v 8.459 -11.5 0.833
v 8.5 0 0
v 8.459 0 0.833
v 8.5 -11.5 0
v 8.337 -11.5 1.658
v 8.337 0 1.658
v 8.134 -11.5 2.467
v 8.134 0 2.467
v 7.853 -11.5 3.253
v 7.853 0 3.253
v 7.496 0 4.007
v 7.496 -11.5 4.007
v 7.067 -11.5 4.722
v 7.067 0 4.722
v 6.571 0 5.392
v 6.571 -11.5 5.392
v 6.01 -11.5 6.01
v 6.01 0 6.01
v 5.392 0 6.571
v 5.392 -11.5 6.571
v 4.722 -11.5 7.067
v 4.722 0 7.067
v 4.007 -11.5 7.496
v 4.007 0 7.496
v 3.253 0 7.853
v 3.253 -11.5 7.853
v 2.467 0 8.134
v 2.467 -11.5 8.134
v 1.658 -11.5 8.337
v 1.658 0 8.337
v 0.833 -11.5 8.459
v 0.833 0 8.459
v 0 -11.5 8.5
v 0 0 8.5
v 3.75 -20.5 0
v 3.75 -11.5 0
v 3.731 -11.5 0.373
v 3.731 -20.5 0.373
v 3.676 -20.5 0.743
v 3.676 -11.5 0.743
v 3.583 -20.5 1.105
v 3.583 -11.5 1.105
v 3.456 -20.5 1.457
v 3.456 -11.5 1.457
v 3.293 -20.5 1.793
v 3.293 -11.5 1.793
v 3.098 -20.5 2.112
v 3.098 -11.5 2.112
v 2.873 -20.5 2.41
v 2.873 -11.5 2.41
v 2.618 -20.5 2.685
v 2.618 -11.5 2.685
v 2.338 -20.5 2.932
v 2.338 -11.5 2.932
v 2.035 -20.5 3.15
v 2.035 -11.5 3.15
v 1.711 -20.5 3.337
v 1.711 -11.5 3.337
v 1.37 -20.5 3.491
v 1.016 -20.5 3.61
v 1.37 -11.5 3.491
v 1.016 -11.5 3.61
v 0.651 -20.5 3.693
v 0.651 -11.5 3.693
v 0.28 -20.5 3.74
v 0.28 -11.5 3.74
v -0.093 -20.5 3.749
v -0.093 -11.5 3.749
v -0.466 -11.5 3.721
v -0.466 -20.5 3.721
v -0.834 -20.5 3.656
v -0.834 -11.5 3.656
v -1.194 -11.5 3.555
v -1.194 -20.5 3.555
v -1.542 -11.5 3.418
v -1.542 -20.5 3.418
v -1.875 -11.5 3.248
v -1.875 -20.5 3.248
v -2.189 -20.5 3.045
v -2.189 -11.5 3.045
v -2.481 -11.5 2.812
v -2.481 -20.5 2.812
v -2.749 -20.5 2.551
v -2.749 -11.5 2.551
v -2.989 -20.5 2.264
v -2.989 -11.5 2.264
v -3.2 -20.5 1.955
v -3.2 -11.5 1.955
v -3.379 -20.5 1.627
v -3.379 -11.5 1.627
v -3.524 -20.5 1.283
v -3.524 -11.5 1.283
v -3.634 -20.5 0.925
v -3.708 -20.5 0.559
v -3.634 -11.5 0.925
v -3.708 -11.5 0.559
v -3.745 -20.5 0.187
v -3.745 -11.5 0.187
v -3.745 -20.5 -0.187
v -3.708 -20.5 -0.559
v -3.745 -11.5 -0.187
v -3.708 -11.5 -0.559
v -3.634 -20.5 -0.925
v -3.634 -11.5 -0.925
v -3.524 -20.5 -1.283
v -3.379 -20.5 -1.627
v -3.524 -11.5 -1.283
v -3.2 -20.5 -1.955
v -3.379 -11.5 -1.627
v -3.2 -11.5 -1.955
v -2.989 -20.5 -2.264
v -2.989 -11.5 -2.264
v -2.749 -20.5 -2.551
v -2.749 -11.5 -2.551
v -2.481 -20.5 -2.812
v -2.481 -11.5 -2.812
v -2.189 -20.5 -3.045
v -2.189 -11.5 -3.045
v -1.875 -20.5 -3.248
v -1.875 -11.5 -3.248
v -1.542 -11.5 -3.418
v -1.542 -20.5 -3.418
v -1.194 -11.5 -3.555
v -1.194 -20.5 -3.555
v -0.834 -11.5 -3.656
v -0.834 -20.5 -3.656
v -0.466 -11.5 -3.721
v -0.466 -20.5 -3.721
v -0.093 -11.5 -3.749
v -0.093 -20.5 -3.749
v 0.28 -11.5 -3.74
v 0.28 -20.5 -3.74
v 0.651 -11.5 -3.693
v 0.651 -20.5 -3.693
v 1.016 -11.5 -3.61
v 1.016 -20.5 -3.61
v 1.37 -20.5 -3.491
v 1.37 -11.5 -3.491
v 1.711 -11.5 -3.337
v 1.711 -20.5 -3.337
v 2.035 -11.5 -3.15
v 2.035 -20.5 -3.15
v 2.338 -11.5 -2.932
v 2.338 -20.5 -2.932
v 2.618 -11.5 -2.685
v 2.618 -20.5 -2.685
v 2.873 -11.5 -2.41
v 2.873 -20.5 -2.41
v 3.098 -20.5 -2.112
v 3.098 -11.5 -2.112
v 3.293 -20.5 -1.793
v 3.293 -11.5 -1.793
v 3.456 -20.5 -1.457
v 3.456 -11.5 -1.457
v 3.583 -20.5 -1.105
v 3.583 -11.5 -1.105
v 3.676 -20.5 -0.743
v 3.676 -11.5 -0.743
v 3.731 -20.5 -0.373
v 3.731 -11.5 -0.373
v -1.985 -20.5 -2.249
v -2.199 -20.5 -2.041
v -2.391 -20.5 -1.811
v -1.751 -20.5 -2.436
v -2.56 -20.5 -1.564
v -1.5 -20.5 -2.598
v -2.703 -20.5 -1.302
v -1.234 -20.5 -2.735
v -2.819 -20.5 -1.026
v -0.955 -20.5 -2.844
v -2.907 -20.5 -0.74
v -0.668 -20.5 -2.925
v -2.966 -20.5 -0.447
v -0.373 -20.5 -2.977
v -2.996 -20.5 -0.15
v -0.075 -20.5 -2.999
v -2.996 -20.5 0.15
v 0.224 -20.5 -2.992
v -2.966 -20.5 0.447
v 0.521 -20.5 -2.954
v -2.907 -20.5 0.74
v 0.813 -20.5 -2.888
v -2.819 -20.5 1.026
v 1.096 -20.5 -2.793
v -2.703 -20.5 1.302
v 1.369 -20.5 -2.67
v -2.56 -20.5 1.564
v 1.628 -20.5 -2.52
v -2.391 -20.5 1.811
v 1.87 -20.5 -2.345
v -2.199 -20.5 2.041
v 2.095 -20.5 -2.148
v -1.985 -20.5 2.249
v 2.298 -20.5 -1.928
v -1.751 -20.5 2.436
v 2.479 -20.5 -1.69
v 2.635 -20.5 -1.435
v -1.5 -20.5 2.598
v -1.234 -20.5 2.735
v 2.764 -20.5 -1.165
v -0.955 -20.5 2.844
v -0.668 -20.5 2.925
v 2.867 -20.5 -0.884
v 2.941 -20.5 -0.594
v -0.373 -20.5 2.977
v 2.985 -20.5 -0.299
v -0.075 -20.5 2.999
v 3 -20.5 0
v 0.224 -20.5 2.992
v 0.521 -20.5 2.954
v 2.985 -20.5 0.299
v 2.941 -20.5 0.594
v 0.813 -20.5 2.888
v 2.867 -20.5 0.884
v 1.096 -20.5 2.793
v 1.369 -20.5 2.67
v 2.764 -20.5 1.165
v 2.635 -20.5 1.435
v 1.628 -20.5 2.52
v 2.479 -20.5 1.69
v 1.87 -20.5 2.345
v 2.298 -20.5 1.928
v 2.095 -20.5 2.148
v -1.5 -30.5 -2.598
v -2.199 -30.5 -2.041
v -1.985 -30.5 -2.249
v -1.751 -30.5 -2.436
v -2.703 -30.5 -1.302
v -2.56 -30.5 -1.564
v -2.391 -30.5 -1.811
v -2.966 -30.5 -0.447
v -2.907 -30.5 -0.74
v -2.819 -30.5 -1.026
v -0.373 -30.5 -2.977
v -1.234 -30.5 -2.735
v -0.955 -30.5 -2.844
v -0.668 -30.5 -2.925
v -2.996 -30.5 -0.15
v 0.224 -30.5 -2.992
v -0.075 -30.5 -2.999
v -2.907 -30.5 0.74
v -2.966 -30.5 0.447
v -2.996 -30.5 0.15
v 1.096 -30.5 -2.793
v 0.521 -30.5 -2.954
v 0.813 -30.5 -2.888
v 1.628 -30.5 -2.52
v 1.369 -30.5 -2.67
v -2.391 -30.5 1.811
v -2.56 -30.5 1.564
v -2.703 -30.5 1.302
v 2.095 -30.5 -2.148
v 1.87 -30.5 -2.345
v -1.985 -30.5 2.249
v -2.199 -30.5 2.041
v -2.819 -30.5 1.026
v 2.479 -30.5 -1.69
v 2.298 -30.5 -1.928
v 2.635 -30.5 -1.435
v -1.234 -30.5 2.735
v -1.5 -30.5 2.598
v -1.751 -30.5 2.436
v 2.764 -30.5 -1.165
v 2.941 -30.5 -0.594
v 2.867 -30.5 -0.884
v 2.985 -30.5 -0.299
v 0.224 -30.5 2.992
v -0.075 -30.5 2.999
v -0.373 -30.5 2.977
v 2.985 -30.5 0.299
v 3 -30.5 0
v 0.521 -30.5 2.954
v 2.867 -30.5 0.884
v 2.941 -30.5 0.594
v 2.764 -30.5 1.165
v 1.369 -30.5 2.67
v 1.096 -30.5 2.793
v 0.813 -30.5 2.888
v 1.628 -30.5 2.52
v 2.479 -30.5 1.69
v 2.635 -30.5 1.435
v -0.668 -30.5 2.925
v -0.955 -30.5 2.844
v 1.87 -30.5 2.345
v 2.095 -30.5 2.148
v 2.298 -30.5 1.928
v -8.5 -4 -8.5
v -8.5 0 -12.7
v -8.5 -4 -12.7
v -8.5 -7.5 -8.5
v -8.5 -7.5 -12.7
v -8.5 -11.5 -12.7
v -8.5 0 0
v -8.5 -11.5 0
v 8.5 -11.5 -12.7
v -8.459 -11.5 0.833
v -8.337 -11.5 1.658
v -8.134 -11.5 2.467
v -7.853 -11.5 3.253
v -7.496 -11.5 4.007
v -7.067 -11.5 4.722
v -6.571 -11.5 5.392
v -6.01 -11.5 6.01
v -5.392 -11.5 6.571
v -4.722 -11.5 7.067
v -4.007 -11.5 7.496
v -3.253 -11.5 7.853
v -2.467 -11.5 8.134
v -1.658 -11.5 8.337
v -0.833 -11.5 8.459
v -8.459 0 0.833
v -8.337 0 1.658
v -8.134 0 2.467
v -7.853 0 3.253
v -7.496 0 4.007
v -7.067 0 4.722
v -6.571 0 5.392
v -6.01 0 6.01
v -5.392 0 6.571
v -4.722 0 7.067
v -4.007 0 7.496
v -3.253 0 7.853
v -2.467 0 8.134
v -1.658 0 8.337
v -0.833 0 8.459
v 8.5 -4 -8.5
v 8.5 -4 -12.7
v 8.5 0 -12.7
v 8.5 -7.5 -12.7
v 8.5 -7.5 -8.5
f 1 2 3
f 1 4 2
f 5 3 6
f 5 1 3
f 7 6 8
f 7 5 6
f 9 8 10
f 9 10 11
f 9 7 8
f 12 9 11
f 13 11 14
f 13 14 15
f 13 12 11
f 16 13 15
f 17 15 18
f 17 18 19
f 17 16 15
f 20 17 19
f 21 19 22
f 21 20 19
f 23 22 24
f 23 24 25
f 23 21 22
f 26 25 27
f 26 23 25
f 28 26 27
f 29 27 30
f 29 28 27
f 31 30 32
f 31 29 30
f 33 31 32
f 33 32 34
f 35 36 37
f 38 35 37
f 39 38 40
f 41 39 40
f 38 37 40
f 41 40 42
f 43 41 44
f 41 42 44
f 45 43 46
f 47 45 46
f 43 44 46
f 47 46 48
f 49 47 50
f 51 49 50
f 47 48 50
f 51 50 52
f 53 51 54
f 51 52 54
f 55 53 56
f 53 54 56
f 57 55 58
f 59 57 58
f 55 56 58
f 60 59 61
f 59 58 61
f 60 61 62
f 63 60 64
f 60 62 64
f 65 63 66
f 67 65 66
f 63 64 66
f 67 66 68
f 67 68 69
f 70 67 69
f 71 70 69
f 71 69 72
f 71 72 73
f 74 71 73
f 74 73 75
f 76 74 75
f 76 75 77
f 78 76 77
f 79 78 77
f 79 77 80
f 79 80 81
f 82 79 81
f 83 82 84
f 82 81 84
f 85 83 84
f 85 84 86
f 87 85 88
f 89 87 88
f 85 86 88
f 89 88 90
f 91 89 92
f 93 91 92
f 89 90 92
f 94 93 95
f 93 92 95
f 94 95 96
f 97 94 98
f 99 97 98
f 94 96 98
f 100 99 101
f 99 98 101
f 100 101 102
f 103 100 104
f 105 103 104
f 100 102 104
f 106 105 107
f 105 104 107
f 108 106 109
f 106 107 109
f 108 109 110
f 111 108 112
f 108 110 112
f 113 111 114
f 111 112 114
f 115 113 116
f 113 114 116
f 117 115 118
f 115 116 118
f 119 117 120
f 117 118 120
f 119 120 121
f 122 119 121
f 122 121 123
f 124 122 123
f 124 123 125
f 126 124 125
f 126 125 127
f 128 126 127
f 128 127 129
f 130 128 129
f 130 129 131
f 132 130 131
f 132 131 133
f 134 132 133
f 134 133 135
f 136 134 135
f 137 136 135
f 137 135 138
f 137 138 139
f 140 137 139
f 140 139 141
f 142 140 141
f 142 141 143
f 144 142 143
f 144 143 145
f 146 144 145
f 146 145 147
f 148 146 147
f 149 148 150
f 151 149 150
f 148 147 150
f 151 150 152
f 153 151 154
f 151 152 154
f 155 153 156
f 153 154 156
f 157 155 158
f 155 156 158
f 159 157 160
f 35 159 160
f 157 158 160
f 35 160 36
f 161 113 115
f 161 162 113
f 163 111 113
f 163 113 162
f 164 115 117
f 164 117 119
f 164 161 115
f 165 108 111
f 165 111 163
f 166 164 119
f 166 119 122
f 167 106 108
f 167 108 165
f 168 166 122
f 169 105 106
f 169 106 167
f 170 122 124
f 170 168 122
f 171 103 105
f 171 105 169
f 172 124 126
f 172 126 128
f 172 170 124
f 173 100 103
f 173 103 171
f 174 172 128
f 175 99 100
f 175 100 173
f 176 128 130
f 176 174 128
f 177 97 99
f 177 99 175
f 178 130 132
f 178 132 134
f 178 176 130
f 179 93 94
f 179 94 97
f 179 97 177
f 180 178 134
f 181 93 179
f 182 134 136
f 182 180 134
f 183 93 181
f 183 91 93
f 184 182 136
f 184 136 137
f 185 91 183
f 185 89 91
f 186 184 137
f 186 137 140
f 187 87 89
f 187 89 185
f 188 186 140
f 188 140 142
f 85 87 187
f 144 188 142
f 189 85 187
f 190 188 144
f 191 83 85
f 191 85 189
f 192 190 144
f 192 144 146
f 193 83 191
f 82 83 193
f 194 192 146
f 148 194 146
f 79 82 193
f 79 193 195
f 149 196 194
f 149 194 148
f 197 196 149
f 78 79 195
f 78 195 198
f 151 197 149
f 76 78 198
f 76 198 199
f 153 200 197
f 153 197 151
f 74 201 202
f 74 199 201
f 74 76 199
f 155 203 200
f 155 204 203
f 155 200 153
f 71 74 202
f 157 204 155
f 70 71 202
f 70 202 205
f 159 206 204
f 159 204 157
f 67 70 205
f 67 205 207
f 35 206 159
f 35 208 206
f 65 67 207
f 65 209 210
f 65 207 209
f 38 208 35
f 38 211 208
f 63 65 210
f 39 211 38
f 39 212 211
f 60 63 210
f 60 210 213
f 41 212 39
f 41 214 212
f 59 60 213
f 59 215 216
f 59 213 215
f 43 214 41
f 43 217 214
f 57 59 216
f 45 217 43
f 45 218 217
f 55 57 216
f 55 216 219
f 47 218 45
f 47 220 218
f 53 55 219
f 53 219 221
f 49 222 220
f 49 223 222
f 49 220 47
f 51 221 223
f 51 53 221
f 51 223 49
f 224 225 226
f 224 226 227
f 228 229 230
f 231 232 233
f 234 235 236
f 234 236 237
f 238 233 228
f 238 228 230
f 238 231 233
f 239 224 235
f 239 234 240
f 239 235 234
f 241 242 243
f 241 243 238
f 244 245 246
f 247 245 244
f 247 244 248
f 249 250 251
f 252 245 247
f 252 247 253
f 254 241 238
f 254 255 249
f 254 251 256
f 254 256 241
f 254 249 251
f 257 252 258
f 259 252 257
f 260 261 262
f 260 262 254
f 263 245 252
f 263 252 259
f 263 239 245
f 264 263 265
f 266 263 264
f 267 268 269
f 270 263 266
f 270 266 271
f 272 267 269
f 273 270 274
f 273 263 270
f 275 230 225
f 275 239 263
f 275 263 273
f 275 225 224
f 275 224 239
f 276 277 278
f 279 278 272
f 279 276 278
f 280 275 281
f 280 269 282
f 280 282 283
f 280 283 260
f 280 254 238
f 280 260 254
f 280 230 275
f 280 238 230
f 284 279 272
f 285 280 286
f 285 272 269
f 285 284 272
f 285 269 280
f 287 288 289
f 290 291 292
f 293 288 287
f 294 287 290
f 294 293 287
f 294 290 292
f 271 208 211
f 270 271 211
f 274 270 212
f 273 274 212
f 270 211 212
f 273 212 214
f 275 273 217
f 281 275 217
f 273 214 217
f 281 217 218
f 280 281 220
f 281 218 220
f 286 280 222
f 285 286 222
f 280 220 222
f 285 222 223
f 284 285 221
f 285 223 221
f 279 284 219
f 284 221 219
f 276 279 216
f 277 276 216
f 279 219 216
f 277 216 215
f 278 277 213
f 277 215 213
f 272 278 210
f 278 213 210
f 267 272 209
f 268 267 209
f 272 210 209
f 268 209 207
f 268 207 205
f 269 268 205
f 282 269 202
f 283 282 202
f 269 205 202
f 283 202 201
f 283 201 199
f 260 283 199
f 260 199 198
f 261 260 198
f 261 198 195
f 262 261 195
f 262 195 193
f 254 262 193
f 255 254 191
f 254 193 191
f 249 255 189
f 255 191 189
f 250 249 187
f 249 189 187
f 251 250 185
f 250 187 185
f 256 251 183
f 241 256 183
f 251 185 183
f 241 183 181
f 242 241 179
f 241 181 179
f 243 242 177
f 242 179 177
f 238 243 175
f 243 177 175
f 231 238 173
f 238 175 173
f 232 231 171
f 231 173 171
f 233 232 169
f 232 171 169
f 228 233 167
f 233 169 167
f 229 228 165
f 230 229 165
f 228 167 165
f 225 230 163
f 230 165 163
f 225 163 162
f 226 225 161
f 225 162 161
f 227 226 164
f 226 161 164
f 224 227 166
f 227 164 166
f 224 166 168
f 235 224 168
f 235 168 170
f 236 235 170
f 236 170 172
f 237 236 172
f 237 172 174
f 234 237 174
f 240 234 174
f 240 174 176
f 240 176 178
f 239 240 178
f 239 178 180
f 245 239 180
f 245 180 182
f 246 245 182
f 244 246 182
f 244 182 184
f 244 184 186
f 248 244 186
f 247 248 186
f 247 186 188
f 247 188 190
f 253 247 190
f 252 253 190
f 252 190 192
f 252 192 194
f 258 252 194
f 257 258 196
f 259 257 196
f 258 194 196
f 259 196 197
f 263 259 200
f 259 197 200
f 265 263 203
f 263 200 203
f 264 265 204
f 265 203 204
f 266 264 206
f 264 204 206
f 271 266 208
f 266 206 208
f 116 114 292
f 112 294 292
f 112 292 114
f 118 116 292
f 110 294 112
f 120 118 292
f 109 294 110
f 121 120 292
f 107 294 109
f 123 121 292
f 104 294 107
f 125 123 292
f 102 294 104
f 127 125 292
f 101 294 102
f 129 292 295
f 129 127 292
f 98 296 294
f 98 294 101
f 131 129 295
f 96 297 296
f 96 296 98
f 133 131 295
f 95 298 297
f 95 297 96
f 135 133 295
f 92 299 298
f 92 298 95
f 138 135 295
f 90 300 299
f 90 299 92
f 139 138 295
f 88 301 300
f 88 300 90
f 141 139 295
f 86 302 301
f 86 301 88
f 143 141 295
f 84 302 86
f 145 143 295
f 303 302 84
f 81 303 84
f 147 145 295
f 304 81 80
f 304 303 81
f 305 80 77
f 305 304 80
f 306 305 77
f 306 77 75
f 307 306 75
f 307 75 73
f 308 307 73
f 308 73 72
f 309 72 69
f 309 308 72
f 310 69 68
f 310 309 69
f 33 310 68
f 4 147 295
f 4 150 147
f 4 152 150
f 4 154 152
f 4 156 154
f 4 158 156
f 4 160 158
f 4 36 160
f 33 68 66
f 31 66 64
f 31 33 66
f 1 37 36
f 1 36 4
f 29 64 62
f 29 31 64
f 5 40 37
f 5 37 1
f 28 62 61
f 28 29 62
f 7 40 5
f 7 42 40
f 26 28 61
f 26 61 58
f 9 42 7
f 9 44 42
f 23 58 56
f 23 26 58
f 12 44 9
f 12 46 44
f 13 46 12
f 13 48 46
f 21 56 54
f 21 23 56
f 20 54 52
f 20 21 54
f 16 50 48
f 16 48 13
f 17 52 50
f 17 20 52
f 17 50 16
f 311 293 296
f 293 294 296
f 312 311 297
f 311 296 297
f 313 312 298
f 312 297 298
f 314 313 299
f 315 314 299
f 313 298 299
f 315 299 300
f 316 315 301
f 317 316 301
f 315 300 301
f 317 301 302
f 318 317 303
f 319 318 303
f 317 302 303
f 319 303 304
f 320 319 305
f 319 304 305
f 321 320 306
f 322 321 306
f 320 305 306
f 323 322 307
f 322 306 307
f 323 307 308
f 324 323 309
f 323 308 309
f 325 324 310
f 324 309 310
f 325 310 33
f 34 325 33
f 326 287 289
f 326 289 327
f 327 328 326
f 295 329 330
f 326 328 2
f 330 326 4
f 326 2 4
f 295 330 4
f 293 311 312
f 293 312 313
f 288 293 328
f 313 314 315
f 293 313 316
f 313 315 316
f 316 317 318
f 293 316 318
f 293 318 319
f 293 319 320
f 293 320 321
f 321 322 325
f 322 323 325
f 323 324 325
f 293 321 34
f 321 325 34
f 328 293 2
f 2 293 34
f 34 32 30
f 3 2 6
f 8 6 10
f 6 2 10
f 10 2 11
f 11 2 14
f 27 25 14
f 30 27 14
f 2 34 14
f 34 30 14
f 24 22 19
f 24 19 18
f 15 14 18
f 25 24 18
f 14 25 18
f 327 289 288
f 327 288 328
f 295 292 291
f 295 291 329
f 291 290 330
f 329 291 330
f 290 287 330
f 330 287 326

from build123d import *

# Parameters (mm, degrees)
F0_W     = 17
F0_H     = 17
F1_DEPTH = 11.5
F2_R     = 3.75
F3_DEPTH = 9
F4_R     = 3
F5_DEPTH = 10
F6_W     = 17
F6_H     = 4
F7_DEPTH = 4.2
F8_R     = 8.49999


# Not quite as in the source:
# - a fillet or chamfer is up to 0.001 mm smaller than in the source, because OpenCascade refuses the exact size


with BuildPart() as f1:
    # F0 (on Front) → F1 (new body)
    with BuildSketch(Plane.XZ):
        Rectangle(F0_W, F0_H)
    extrude(amount=F1_DEPTH)

    # F2 (on face) → F3 (join)
    with BuildSketch(Plane.XZ.offset(11.5)):
        Circle(F2_R)
    extrude(amount=F3_DEPTH)

    # F4 (on face) → F5 (join)
    with BuildSketch(Plane.XZ.offset(20.5)):
        Circle(F4_R)
    extrude(amount=F5_DEPTH)

    # F6 (on face) → F7 (join)
    with BuildSketch(Plane(origin=(0, 0, -8.5), x_dir=(1, 0, 0), z_dir=(0, 0, -1))):
        with Locations((0, 2)):
            Rectangle(F6_W, F6_H)
        with Locations((0, 9.5)):
            Rectangle(F6_W, F6_H)
    extrude(amount=F7_DEPTH)

    # F8 (radius 8.5 in the source; OpenCascade refuses exactly that, so slightly less here)
    f8_edges = [f1.edges().sort_by_distance(p)[0] for p in [
        (8.5, -5.75, 8.5),
        (-8.5, -5.75, 8.5),
    ]]
    fillet(f8_edges, radius=F8_R)


solid = f1.part
